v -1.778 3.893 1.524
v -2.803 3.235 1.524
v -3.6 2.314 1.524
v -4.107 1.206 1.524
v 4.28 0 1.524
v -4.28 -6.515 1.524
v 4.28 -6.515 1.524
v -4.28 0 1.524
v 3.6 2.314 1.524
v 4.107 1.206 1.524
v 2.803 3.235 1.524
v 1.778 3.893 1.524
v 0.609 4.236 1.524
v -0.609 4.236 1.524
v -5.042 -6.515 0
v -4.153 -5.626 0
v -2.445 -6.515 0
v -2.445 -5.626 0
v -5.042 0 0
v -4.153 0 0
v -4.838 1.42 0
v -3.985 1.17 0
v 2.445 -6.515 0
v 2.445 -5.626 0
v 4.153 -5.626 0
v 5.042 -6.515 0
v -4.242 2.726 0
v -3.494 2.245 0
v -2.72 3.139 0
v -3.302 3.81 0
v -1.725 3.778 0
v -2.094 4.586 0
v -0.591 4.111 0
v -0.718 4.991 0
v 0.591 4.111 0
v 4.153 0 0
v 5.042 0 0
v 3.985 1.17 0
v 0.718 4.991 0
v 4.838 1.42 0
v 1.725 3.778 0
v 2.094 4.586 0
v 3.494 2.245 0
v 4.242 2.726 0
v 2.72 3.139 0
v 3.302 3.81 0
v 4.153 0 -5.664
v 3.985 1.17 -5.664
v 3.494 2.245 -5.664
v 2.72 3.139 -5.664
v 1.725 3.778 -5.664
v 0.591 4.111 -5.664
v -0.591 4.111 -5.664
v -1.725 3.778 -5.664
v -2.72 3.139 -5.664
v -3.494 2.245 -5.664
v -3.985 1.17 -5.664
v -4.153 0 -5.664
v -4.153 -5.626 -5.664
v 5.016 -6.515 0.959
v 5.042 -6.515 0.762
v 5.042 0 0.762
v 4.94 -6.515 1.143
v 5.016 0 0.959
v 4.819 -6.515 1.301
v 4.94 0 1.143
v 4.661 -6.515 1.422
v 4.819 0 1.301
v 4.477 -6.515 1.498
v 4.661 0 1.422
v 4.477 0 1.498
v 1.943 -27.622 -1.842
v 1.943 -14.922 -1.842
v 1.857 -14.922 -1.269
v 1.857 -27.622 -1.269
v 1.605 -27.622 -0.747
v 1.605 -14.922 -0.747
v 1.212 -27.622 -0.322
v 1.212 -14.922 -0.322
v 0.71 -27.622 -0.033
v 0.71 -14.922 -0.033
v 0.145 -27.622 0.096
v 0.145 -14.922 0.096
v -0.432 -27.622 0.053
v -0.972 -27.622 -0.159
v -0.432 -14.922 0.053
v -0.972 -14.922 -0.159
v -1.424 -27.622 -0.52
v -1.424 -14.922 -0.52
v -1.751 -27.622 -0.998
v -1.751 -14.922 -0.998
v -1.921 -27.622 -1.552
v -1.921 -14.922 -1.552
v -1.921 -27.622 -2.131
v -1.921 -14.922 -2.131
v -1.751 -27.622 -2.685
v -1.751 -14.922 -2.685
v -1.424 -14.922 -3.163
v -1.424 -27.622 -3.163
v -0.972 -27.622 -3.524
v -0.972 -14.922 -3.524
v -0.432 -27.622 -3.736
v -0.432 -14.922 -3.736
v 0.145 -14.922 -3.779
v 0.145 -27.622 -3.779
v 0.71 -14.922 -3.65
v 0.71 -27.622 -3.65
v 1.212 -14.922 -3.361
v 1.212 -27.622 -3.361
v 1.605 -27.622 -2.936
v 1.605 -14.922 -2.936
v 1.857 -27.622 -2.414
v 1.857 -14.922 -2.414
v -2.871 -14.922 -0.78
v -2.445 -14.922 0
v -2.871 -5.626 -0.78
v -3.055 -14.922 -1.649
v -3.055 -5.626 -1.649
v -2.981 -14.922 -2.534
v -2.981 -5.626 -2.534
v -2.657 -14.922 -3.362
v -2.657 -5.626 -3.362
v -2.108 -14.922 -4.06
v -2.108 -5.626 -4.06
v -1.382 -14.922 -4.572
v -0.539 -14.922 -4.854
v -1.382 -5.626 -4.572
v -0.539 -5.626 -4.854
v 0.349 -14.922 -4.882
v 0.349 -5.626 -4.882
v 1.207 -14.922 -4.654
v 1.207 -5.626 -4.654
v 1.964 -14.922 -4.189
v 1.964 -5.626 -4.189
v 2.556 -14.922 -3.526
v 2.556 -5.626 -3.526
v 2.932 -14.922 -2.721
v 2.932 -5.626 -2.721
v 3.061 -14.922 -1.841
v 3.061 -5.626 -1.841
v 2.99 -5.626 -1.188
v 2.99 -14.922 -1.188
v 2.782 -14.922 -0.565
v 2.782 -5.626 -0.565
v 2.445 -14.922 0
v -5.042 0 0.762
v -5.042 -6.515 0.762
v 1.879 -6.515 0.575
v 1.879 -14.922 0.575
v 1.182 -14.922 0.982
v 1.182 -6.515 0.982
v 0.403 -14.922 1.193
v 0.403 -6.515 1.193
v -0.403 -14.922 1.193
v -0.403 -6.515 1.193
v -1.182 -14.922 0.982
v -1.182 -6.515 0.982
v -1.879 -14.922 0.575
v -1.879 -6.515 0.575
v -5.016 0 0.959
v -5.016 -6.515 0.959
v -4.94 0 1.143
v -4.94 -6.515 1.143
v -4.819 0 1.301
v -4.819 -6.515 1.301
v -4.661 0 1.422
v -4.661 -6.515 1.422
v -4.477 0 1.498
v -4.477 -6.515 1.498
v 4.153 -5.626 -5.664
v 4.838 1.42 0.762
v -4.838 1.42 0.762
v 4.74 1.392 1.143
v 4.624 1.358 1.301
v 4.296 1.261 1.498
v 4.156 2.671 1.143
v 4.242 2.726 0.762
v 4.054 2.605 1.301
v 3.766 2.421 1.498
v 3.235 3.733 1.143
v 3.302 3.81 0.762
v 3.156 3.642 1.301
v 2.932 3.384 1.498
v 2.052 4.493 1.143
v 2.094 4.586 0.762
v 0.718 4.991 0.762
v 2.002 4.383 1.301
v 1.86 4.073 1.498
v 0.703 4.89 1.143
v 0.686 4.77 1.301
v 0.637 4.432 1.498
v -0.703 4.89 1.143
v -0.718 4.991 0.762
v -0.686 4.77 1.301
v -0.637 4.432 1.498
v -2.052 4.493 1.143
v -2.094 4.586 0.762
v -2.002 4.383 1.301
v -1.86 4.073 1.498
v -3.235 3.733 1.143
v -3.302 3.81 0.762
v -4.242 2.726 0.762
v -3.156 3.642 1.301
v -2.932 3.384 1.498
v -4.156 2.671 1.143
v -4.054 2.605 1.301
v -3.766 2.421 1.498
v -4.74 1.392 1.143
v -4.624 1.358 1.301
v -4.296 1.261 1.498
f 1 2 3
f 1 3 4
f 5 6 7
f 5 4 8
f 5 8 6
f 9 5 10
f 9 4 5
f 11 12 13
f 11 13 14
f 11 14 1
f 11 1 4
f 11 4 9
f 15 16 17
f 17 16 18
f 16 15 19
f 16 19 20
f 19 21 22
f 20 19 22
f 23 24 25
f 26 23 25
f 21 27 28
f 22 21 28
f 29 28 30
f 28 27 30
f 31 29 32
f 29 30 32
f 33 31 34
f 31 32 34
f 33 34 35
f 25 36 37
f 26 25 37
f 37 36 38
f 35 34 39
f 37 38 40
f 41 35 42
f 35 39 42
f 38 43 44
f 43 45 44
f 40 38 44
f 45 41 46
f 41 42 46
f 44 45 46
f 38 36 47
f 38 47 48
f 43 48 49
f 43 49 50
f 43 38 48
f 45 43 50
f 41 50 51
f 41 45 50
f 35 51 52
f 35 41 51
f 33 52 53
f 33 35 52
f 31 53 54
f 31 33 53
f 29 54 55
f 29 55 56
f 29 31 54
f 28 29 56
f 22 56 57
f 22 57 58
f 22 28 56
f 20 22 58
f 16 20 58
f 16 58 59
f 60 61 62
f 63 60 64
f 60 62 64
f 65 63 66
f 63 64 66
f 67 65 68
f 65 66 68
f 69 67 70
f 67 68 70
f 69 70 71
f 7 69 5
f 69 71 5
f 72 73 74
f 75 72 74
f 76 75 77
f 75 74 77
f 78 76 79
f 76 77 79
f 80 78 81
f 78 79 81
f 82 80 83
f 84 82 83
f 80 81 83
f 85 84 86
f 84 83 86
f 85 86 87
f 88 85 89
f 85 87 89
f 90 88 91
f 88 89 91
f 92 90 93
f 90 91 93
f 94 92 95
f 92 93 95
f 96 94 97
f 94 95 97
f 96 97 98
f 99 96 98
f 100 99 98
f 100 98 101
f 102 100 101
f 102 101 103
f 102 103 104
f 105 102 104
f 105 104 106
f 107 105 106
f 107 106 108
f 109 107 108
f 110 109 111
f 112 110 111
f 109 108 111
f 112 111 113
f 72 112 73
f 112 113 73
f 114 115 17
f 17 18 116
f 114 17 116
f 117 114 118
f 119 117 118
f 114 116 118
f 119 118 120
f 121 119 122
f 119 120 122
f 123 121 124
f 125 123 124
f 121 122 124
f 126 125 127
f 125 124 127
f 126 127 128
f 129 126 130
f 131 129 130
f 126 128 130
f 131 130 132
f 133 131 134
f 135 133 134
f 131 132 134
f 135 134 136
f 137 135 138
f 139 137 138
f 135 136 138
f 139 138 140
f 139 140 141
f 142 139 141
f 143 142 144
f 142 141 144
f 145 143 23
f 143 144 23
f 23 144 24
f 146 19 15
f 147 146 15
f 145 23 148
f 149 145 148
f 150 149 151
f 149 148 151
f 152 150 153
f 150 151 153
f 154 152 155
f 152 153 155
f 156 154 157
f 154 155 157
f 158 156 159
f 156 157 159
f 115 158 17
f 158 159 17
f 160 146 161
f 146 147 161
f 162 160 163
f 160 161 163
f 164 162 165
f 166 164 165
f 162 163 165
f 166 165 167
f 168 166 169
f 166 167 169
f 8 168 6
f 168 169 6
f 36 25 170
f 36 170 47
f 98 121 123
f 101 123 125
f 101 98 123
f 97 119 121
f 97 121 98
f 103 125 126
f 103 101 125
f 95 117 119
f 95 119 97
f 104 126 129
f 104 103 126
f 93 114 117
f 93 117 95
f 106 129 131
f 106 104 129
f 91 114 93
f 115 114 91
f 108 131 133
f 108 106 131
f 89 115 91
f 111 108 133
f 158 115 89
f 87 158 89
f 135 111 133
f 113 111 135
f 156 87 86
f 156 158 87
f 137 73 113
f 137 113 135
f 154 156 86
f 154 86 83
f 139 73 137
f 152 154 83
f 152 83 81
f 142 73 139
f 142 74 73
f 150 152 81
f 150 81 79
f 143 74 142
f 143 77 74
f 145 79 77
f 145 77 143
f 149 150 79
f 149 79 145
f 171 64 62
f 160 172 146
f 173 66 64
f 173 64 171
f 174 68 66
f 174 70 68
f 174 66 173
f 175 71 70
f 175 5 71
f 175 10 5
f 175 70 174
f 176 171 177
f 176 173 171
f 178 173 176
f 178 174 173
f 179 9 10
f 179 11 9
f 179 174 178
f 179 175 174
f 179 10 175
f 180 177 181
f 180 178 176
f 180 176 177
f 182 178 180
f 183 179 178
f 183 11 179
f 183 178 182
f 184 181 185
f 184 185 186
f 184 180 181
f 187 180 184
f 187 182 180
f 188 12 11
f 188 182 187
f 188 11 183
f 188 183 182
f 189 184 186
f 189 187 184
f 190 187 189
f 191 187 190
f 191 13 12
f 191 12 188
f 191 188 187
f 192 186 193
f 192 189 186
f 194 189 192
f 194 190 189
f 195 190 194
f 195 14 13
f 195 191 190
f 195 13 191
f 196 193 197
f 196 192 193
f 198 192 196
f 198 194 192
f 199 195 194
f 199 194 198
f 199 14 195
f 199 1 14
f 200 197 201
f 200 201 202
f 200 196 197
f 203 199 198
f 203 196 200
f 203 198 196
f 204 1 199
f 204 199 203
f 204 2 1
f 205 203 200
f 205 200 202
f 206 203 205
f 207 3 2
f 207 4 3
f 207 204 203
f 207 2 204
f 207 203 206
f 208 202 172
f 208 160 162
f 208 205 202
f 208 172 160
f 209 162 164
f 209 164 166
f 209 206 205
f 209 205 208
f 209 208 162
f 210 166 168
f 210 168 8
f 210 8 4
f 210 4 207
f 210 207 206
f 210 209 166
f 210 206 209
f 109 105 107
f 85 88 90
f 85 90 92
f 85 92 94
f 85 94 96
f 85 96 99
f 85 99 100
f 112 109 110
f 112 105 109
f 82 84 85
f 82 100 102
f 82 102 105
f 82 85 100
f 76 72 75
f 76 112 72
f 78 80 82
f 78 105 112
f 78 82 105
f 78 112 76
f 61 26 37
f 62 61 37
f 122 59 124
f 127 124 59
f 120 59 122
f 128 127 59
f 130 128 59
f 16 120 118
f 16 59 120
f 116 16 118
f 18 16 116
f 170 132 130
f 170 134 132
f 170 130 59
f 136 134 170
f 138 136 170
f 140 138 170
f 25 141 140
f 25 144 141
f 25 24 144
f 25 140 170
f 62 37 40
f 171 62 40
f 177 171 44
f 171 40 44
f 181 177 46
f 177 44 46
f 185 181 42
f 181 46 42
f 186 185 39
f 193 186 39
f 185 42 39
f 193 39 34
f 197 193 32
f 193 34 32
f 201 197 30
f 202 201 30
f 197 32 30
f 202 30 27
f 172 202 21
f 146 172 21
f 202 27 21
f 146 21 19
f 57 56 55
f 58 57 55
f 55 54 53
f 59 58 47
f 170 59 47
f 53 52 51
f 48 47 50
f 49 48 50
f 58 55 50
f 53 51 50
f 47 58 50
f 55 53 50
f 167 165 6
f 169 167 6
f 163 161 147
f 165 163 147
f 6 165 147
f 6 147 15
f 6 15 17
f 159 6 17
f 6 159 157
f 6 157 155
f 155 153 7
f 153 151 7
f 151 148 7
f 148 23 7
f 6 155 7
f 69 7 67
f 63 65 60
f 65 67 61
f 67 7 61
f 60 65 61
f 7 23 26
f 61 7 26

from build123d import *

# Parameters (mm, degrees)
F1_DEPTH = 5.6642
F3_DEPTH = 1.524
F4_DEPTH = 1.524
F6_DEPTH = 9.2964
F7_R     = 0.762
F8_R     = 1.9431
F9_DEPTH = 12.7


with BuildPart() as f1:
    # F0 (on Top) → F1 (new body)
    with BuildSketch(Plane.XY):
        with BuildLine():
            Line((4.1529, -5.6261), (4.1529, 0))
            ThreePointArc((4.1529, 0), (0, 4.1529), (-4.1529, 0))
            Line((-4.1529, 0), (-4.1529, -5.6261))
            Line((-4.1529, -5.6261), (4.1529, -5.6261))
        make_face()
    extrude(amount=-F1_DEPTH)

    # F2 (on face) → F3 (join)
    with BuildSketch(Plane.XY):
        with BuildLine():
            ThreePointArc((5.0419, 0), (0, 5.0419), (-5.0419, 0))
            Line((-5.0419, 0), (-5.0419, -6.5151))
            Line((-5.0419, -6.5151), (5.0419, -6.5151))
            Line((5.0419, -6.5151), (5.0419, 0))
        make_face()
        with BuildLine():
            Line((-4.1529, -5.6261), (-4.1529, 0))
            ThreePointArc((-4.1529, 0), (0, 4.1529), (4.1529, 0))
            Line((4.1529, 0), (4.1529, -5.6261))
            Line((4.1529, -5.6261), (-4.1529, -5.6261))
        make_face(mode=Mode.SUBTRACT)
    extrude(amount=F3_DEPTH)



with BuildPart() as f4:
    # F1_face (on face) → F4 (new body, through all)
    with BuildSketch(Plane(origin=(0, -1.133876, 0), x_dir=(1, 0, 0), z_dir=(0, 0, 1))):
        with BuildLine():
            Line((-4.1529, 1.133876), (-4.1529, -4.492224))
            Line((-4.1529, -4.492224), (4.1529, -4.492224))
            Line((4.1529, -4.492224), (4.1529, 1.133876))
            ThreePointArc((4.1529, 1.133876), (0, 5.286776), (-4.1529, 1.133876))
        make_face()
    extrude(amount=F4_DEPTH)


with BuildPart() as f1_1:
    add(f1.part)

    add(f4.part)  # F6 merges F4
    # F5 (on face) → F6 (join)
    with BuildSketch(Plane.XZ.offset(5.6261)):
        with BuildLine():
            ThreePointArc((-2.444742, 0), (-0.970892, -4.744129), (3.0607, -1.8415))
            ThreePointArc((3.0607, -1.8415), (2.902629, -0.870608), (2.444742, 0))
            Line((2.444742, 0), (-2.444742, 0))
        make_face()
        with BuildLine():
            Line((-2.444742, 0), (2.444742, 0))
            ThreePointArc((2.444742, 0), (0, 1.2192), (-2.444742, 0))
        make_face()
    extrude(amount=F6_DEPTH)

    # F7
    f7_edges = [f1_1.edges().sort_by_distance(p)[0] for p in [
        (5.0419, -3.25755, 1.524),
    ]]
    fillet(f7_edges, radius=F7_R)

    # F8 (on face) → F9 (join)
    with BuildSketch(Plane.XZ.offset(14.9225)):
        with Locations((0, -1.8415)):
            Circle(F8_R)
    extrude(amount=F9_DEPTH)


solid = f1_1.part
